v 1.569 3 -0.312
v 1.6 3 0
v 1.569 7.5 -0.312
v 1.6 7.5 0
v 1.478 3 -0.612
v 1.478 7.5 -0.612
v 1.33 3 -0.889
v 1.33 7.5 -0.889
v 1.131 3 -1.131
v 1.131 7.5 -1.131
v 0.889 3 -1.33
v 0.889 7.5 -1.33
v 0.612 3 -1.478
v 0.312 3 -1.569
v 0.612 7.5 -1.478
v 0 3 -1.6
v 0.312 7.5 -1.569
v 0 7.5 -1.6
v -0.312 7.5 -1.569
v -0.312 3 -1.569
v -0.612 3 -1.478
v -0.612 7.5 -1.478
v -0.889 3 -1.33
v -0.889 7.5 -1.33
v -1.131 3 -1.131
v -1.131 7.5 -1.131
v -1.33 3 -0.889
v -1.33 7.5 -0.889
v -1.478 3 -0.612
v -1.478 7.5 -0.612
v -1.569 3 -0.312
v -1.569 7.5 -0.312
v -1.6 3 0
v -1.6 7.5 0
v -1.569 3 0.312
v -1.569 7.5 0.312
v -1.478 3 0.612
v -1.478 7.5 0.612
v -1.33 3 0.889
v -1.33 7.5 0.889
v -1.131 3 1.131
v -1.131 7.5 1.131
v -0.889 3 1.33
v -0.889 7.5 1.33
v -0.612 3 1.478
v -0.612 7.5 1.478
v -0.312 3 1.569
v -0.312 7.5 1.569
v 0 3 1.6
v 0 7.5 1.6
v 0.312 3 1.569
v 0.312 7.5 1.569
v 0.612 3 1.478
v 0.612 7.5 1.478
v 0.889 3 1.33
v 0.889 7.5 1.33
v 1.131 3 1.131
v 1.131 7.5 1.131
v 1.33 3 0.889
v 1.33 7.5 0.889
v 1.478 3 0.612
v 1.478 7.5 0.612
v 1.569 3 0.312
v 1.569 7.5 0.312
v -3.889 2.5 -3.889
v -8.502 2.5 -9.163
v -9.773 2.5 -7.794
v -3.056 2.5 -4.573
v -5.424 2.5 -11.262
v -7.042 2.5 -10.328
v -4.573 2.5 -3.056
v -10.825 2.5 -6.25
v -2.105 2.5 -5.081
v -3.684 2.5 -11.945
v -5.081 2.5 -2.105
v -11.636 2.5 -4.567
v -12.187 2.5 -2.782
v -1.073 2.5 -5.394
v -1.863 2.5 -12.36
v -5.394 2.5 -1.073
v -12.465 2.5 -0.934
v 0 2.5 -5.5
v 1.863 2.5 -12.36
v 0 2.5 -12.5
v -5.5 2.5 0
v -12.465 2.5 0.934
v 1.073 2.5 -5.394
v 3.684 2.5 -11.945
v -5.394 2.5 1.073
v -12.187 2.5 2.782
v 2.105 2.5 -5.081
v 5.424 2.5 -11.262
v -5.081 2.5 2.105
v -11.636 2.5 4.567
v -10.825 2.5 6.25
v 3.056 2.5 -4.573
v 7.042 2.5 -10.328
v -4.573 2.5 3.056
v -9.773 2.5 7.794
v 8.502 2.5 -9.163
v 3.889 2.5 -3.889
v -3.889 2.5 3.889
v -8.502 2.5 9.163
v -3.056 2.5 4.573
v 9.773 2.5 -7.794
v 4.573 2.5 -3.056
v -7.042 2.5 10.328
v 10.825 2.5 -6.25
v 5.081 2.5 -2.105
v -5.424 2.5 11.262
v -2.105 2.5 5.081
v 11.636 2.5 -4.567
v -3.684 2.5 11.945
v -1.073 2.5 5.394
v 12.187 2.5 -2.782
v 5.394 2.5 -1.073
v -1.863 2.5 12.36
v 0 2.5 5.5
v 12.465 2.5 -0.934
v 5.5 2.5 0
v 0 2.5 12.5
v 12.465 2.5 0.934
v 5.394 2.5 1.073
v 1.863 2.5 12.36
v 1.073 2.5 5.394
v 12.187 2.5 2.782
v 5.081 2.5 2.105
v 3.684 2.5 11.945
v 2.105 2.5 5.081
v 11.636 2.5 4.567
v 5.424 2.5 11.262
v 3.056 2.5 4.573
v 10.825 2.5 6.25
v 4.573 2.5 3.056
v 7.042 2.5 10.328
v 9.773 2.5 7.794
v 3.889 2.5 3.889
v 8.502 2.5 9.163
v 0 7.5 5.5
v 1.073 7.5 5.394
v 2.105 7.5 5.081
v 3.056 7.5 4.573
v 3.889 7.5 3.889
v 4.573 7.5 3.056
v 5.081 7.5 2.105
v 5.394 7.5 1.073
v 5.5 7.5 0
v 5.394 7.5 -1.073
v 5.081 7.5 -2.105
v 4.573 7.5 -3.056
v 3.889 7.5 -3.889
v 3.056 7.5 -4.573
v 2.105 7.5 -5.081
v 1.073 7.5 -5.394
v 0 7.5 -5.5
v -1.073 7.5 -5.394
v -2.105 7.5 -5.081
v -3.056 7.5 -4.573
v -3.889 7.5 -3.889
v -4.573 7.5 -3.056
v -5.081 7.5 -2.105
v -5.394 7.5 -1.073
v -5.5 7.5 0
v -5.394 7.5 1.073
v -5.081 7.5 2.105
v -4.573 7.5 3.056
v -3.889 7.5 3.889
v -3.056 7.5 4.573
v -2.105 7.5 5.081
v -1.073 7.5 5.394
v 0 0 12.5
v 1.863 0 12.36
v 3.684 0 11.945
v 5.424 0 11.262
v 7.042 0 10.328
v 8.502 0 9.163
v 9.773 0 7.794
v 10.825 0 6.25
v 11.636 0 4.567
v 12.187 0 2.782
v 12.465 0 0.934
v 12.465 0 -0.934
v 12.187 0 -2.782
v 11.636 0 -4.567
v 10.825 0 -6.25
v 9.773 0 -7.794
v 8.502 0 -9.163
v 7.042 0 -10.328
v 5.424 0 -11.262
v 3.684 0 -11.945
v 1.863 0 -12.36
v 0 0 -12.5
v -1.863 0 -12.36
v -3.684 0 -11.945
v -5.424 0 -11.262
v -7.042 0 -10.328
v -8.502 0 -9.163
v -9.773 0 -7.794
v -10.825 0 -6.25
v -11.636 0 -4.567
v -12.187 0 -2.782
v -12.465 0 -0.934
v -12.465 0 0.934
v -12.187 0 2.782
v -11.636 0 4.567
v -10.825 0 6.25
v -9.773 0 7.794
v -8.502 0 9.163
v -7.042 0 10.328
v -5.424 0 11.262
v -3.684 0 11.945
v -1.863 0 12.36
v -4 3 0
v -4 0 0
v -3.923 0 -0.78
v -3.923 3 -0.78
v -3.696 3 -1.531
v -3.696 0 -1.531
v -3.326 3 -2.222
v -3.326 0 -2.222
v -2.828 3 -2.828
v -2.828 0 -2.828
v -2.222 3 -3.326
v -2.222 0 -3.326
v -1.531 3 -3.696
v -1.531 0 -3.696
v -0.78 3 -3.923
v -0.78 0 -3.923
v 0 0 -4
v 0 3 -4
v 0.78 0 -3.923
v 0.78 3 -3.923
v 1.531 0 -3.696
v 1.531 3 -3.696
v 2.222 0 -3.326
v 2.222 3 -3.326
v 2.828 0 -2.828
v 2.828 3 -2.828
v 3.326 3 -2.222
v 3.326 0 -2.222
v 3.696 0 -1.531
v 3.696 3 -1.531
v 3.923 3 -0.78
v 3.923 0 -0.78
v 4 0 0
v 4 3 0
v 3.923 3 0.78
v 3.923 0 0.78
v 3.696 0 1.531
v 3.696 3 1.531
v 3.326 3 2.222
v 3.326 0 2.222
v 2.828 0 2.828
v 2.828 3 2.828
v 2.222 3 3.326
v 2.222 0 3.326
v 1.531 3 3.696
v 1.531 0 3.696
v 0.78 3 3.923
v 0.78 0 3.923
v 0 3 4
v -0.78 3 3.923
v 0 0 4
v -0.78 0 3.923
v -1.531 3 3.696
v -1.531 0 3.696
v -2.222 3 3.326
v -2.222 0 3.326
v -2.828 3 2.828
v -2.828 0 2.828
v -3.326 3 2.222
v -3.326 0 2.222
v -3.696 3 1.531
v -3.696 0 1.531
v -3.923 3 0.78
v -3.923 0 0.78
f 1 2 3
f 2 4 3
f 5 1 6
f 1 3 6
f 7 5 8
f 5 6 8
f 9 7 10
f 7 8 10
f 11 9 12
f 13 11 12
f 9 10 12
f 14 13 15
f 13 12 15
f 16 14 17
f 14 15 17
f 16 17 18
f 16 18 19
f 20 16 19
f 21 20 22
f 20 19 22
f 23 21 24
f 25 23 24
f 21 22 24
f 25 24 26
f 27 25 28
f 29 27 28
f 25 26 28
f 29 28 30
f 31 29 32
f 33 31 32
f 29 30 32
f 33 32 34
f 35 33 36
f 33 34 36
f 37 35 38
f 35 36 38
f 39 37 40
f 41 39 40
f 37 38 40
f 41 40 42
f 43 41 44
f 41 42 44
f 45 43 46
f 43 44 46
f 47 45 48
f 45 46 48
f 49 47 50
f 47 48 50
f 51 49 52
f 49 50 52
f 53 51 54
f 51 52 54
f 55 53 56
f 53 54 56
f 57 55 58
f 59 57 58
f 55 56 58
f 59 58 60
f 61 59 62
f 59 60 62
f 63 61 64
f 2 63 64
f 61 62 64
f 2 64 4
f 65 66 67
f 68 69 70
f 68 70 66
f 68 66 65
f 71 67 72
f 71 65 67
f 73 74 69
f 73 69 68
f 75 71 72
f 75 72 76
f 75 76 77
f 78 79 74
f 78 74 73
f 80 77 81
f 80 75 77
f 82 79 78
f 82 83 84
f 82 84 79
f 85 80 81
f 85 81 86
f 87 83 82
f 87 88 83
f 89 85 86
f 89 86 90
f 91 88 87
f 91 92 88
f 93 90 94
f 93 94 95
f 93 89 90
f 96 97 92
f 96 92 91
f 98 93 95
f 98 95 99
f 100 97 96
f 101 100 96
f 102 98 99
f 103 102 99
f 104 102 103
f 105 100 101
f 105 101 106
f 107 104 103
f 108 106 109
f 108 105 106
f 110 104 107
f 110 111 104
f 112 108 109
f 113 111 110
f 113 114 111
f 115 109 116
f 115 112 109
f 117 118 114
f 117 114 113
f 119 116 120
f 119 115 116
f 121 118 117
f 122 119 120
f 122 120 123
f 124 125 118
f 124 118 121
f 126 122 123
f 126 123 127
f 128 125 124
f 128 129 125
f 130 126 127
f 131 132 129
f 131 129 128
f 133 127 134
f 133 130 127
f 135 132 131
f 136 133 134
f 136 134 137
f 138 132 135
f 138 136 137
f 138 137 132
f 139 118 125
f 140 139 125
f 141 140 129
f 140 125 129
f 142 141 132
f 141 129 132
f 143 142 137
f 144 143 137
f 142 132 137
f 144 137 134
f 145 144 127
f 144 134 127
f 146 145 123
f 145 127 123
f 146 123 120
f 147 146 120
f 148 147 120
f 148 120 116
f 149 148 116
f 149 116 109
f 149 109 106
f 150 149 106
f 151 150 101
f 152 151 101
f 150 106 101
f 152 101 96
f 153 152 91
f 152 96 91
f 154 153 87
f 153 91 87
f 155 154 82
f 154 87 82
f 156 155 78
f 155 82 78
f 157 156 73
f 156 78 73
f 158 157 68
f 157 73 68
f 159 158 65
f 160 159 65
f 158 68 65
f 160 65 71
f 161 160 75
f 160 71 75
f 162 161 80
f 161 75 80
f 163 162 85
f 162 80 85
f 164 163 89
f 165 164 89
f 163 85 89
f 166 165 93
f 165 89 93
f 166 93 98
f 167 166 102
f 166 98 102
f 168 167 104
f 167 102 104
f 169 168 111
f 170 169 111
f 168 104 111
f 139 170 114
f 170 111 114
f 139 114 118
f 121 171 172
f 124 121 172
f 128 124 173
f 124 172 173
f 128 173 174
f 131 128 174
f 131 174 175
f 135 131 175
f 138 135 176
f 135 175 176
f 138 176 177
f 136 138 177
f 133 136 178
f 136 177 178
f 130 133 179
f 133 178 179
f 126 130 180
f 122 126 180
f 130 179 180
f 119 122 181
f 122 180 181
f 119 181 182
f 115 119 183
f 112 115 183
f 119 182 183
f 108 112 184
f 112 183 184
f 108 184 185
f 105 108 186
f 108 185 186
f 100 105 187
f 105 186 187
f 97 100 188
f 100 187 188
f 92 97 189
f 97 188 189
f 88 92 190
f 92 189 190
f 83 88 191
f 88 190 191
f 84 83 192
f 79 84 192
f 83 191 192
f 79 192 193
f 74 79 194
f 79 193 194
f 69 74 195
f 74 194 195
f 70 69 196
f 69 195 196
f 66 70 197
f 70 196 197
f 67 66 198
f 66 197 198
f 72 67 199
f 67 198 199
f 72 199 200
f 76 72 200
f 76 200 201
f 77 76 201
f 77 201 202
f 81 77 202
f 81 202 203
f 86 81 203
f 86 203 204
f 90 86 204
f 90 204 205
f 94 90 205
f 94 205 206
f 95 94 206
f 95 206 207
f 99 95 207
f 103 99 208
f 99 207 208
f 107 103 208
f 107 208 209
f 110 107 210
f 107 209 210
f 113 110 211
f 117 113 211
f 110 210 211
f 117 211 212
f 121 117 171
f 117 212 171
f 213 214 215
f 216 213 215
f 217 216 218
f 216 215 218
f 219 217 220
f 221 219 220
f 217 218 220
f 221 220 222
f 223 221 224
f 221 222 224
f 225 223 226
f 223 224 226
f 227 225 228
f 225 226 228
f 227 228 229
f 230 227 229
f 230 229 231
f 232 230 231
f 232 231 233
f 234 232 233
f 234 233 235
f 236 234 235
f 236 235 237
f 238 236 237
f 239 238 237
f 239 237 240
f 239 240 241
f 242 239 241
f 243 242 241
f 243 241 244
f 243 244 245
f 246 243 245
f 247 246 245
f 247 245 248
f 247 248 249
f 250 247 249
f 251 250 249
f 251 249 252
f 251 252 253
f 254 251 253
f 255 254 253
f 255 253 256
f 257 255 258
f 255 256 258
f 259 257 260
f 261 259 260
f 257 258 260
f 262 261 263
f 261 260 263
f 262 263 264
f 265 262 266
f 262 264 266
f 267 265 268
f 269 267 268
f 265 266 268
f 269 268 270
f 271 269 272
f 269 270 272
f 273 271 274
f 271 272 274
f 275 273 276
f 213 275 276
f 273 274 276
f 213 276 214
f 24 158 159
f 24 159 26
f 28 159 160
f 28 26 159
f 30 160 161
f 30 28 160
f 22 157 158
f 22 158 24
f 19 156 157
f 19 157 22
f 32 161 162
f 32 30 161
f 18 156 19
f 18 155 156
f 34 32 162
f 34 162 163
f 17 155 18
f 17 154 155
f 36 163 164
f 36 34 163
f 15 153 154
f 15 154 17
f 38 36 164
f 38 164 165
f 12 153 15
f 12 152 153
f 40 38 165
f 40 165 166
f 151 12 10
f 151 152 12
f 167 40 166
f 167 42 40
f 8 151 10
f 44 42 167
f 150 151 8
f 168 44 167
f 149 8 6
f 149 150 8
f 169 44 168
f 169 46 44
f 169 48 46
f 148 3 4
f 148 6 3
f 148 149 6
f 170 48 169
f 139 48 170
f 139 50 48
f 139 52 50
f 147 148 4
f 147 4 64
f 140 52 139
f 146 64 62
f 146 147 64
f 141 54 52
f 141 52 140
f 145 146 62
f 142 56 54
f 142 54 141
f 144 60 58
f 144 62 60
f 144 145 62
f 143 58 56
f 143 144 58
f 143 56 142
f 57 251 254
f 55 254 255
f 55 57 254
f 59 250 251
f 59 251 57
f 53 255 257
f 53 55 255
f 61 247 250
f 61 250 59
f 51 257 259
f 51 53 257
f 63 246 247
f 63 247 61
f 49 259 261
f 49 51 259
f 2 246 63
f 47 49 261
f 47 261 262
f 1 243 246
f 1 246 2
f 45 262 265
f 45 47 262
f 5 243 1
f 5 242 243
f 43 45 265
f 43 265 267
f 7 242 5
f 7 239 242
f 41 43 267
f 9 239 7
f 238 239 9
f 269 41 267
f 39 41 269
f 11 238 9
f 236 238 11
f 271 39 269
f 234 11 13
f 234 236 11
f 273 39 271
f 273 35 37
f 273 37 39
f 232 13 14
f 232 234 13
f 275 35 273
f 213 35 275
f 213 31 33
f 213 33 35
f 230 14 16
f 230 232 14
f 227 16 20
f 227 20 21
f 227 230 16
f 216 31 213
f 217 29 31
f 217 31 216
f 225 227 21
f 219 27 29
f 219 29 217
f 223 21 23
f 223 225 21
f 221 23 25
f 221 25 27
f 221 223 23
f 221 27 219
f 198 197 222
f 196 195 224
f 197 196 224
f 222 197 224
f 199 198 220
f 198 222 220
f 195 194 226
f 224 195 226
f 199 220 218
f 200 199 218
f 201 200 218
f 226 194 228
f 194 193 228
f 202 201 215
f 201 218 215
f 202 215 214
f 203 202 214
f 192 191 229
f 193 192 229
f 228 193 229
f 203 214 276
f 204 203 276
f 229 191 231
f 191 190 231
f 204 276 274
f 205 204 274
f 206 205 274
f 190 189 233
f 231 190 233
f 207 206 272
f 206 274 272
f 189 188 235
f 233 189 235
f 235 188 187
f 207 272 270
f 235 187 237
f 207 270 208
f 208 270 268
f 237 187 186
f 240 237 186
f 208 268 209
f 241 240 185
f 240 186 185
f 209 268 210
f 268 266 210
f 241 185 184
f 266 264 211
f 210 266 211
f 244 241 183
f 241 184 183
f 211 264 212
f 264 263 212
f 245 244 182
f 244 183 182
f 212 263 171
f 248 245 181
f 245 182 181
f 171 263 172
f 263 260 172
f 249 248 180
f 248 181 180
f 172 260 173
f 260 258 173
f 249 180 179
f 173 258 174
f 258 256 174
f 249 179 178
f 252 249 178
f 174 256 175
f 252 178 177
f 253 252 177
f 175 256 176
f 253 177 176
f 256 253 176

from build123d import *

# Parameters (mm, degrees)
SKETCH1_R           = 12.5
BOSS_EXTRUDE1_DEPTH = 2.5
SKETCH2_R           = 5.5
BOSS_EXTRUDE2_DEPTH = 5
HOLE1_D             = 3.2
HOLE1_DEPTH         = 100
HOLE1_CBORE_D       = 8
HOLE1_CBORE_DEPTH   = 3


with BuildPart() as part:
    # Sketch1 → Boss-Extrude1 (new body)
    with BuildSketch(Plane(origin=(0, 0, 0), x_dir=(1, 0, 0), z_dir=(0, 1, 0))):
        with Locations(Location((0, 0, 0), (0, 0, 270))):
            Circle(SKETCH1_R)
    extrude(amount=BOSS_EXTRUDE1_DEPTH)

    # Sketch2 → Boss-Extrude2 (add)
    with BuildSketch(Plane(origin=(0, 2.5, 0), x_dir=(1, 0, 0), z_dir=(0, 1, 0))):
        with Locations(Location((0, 0, 0), (0, 0, 270))):
            Circle(SKETCH2_R)
    extrude(amount=BOSS_EXTRUDE2_DEPTH)

    # Hole1
    with Locations(Plane(origin=(0, 0, 0), x_dir=(-1, 0, 0), z_dir=(0, -1, 0))):
        with Locations((0, 0)):
            CounterBoreHole(HOLE1_D / 2, HOLE1_CBORE_D / 2, HOLE1_CBORE_DEPTH, depth=HOLE1_DEPTH)


solid = part.part
